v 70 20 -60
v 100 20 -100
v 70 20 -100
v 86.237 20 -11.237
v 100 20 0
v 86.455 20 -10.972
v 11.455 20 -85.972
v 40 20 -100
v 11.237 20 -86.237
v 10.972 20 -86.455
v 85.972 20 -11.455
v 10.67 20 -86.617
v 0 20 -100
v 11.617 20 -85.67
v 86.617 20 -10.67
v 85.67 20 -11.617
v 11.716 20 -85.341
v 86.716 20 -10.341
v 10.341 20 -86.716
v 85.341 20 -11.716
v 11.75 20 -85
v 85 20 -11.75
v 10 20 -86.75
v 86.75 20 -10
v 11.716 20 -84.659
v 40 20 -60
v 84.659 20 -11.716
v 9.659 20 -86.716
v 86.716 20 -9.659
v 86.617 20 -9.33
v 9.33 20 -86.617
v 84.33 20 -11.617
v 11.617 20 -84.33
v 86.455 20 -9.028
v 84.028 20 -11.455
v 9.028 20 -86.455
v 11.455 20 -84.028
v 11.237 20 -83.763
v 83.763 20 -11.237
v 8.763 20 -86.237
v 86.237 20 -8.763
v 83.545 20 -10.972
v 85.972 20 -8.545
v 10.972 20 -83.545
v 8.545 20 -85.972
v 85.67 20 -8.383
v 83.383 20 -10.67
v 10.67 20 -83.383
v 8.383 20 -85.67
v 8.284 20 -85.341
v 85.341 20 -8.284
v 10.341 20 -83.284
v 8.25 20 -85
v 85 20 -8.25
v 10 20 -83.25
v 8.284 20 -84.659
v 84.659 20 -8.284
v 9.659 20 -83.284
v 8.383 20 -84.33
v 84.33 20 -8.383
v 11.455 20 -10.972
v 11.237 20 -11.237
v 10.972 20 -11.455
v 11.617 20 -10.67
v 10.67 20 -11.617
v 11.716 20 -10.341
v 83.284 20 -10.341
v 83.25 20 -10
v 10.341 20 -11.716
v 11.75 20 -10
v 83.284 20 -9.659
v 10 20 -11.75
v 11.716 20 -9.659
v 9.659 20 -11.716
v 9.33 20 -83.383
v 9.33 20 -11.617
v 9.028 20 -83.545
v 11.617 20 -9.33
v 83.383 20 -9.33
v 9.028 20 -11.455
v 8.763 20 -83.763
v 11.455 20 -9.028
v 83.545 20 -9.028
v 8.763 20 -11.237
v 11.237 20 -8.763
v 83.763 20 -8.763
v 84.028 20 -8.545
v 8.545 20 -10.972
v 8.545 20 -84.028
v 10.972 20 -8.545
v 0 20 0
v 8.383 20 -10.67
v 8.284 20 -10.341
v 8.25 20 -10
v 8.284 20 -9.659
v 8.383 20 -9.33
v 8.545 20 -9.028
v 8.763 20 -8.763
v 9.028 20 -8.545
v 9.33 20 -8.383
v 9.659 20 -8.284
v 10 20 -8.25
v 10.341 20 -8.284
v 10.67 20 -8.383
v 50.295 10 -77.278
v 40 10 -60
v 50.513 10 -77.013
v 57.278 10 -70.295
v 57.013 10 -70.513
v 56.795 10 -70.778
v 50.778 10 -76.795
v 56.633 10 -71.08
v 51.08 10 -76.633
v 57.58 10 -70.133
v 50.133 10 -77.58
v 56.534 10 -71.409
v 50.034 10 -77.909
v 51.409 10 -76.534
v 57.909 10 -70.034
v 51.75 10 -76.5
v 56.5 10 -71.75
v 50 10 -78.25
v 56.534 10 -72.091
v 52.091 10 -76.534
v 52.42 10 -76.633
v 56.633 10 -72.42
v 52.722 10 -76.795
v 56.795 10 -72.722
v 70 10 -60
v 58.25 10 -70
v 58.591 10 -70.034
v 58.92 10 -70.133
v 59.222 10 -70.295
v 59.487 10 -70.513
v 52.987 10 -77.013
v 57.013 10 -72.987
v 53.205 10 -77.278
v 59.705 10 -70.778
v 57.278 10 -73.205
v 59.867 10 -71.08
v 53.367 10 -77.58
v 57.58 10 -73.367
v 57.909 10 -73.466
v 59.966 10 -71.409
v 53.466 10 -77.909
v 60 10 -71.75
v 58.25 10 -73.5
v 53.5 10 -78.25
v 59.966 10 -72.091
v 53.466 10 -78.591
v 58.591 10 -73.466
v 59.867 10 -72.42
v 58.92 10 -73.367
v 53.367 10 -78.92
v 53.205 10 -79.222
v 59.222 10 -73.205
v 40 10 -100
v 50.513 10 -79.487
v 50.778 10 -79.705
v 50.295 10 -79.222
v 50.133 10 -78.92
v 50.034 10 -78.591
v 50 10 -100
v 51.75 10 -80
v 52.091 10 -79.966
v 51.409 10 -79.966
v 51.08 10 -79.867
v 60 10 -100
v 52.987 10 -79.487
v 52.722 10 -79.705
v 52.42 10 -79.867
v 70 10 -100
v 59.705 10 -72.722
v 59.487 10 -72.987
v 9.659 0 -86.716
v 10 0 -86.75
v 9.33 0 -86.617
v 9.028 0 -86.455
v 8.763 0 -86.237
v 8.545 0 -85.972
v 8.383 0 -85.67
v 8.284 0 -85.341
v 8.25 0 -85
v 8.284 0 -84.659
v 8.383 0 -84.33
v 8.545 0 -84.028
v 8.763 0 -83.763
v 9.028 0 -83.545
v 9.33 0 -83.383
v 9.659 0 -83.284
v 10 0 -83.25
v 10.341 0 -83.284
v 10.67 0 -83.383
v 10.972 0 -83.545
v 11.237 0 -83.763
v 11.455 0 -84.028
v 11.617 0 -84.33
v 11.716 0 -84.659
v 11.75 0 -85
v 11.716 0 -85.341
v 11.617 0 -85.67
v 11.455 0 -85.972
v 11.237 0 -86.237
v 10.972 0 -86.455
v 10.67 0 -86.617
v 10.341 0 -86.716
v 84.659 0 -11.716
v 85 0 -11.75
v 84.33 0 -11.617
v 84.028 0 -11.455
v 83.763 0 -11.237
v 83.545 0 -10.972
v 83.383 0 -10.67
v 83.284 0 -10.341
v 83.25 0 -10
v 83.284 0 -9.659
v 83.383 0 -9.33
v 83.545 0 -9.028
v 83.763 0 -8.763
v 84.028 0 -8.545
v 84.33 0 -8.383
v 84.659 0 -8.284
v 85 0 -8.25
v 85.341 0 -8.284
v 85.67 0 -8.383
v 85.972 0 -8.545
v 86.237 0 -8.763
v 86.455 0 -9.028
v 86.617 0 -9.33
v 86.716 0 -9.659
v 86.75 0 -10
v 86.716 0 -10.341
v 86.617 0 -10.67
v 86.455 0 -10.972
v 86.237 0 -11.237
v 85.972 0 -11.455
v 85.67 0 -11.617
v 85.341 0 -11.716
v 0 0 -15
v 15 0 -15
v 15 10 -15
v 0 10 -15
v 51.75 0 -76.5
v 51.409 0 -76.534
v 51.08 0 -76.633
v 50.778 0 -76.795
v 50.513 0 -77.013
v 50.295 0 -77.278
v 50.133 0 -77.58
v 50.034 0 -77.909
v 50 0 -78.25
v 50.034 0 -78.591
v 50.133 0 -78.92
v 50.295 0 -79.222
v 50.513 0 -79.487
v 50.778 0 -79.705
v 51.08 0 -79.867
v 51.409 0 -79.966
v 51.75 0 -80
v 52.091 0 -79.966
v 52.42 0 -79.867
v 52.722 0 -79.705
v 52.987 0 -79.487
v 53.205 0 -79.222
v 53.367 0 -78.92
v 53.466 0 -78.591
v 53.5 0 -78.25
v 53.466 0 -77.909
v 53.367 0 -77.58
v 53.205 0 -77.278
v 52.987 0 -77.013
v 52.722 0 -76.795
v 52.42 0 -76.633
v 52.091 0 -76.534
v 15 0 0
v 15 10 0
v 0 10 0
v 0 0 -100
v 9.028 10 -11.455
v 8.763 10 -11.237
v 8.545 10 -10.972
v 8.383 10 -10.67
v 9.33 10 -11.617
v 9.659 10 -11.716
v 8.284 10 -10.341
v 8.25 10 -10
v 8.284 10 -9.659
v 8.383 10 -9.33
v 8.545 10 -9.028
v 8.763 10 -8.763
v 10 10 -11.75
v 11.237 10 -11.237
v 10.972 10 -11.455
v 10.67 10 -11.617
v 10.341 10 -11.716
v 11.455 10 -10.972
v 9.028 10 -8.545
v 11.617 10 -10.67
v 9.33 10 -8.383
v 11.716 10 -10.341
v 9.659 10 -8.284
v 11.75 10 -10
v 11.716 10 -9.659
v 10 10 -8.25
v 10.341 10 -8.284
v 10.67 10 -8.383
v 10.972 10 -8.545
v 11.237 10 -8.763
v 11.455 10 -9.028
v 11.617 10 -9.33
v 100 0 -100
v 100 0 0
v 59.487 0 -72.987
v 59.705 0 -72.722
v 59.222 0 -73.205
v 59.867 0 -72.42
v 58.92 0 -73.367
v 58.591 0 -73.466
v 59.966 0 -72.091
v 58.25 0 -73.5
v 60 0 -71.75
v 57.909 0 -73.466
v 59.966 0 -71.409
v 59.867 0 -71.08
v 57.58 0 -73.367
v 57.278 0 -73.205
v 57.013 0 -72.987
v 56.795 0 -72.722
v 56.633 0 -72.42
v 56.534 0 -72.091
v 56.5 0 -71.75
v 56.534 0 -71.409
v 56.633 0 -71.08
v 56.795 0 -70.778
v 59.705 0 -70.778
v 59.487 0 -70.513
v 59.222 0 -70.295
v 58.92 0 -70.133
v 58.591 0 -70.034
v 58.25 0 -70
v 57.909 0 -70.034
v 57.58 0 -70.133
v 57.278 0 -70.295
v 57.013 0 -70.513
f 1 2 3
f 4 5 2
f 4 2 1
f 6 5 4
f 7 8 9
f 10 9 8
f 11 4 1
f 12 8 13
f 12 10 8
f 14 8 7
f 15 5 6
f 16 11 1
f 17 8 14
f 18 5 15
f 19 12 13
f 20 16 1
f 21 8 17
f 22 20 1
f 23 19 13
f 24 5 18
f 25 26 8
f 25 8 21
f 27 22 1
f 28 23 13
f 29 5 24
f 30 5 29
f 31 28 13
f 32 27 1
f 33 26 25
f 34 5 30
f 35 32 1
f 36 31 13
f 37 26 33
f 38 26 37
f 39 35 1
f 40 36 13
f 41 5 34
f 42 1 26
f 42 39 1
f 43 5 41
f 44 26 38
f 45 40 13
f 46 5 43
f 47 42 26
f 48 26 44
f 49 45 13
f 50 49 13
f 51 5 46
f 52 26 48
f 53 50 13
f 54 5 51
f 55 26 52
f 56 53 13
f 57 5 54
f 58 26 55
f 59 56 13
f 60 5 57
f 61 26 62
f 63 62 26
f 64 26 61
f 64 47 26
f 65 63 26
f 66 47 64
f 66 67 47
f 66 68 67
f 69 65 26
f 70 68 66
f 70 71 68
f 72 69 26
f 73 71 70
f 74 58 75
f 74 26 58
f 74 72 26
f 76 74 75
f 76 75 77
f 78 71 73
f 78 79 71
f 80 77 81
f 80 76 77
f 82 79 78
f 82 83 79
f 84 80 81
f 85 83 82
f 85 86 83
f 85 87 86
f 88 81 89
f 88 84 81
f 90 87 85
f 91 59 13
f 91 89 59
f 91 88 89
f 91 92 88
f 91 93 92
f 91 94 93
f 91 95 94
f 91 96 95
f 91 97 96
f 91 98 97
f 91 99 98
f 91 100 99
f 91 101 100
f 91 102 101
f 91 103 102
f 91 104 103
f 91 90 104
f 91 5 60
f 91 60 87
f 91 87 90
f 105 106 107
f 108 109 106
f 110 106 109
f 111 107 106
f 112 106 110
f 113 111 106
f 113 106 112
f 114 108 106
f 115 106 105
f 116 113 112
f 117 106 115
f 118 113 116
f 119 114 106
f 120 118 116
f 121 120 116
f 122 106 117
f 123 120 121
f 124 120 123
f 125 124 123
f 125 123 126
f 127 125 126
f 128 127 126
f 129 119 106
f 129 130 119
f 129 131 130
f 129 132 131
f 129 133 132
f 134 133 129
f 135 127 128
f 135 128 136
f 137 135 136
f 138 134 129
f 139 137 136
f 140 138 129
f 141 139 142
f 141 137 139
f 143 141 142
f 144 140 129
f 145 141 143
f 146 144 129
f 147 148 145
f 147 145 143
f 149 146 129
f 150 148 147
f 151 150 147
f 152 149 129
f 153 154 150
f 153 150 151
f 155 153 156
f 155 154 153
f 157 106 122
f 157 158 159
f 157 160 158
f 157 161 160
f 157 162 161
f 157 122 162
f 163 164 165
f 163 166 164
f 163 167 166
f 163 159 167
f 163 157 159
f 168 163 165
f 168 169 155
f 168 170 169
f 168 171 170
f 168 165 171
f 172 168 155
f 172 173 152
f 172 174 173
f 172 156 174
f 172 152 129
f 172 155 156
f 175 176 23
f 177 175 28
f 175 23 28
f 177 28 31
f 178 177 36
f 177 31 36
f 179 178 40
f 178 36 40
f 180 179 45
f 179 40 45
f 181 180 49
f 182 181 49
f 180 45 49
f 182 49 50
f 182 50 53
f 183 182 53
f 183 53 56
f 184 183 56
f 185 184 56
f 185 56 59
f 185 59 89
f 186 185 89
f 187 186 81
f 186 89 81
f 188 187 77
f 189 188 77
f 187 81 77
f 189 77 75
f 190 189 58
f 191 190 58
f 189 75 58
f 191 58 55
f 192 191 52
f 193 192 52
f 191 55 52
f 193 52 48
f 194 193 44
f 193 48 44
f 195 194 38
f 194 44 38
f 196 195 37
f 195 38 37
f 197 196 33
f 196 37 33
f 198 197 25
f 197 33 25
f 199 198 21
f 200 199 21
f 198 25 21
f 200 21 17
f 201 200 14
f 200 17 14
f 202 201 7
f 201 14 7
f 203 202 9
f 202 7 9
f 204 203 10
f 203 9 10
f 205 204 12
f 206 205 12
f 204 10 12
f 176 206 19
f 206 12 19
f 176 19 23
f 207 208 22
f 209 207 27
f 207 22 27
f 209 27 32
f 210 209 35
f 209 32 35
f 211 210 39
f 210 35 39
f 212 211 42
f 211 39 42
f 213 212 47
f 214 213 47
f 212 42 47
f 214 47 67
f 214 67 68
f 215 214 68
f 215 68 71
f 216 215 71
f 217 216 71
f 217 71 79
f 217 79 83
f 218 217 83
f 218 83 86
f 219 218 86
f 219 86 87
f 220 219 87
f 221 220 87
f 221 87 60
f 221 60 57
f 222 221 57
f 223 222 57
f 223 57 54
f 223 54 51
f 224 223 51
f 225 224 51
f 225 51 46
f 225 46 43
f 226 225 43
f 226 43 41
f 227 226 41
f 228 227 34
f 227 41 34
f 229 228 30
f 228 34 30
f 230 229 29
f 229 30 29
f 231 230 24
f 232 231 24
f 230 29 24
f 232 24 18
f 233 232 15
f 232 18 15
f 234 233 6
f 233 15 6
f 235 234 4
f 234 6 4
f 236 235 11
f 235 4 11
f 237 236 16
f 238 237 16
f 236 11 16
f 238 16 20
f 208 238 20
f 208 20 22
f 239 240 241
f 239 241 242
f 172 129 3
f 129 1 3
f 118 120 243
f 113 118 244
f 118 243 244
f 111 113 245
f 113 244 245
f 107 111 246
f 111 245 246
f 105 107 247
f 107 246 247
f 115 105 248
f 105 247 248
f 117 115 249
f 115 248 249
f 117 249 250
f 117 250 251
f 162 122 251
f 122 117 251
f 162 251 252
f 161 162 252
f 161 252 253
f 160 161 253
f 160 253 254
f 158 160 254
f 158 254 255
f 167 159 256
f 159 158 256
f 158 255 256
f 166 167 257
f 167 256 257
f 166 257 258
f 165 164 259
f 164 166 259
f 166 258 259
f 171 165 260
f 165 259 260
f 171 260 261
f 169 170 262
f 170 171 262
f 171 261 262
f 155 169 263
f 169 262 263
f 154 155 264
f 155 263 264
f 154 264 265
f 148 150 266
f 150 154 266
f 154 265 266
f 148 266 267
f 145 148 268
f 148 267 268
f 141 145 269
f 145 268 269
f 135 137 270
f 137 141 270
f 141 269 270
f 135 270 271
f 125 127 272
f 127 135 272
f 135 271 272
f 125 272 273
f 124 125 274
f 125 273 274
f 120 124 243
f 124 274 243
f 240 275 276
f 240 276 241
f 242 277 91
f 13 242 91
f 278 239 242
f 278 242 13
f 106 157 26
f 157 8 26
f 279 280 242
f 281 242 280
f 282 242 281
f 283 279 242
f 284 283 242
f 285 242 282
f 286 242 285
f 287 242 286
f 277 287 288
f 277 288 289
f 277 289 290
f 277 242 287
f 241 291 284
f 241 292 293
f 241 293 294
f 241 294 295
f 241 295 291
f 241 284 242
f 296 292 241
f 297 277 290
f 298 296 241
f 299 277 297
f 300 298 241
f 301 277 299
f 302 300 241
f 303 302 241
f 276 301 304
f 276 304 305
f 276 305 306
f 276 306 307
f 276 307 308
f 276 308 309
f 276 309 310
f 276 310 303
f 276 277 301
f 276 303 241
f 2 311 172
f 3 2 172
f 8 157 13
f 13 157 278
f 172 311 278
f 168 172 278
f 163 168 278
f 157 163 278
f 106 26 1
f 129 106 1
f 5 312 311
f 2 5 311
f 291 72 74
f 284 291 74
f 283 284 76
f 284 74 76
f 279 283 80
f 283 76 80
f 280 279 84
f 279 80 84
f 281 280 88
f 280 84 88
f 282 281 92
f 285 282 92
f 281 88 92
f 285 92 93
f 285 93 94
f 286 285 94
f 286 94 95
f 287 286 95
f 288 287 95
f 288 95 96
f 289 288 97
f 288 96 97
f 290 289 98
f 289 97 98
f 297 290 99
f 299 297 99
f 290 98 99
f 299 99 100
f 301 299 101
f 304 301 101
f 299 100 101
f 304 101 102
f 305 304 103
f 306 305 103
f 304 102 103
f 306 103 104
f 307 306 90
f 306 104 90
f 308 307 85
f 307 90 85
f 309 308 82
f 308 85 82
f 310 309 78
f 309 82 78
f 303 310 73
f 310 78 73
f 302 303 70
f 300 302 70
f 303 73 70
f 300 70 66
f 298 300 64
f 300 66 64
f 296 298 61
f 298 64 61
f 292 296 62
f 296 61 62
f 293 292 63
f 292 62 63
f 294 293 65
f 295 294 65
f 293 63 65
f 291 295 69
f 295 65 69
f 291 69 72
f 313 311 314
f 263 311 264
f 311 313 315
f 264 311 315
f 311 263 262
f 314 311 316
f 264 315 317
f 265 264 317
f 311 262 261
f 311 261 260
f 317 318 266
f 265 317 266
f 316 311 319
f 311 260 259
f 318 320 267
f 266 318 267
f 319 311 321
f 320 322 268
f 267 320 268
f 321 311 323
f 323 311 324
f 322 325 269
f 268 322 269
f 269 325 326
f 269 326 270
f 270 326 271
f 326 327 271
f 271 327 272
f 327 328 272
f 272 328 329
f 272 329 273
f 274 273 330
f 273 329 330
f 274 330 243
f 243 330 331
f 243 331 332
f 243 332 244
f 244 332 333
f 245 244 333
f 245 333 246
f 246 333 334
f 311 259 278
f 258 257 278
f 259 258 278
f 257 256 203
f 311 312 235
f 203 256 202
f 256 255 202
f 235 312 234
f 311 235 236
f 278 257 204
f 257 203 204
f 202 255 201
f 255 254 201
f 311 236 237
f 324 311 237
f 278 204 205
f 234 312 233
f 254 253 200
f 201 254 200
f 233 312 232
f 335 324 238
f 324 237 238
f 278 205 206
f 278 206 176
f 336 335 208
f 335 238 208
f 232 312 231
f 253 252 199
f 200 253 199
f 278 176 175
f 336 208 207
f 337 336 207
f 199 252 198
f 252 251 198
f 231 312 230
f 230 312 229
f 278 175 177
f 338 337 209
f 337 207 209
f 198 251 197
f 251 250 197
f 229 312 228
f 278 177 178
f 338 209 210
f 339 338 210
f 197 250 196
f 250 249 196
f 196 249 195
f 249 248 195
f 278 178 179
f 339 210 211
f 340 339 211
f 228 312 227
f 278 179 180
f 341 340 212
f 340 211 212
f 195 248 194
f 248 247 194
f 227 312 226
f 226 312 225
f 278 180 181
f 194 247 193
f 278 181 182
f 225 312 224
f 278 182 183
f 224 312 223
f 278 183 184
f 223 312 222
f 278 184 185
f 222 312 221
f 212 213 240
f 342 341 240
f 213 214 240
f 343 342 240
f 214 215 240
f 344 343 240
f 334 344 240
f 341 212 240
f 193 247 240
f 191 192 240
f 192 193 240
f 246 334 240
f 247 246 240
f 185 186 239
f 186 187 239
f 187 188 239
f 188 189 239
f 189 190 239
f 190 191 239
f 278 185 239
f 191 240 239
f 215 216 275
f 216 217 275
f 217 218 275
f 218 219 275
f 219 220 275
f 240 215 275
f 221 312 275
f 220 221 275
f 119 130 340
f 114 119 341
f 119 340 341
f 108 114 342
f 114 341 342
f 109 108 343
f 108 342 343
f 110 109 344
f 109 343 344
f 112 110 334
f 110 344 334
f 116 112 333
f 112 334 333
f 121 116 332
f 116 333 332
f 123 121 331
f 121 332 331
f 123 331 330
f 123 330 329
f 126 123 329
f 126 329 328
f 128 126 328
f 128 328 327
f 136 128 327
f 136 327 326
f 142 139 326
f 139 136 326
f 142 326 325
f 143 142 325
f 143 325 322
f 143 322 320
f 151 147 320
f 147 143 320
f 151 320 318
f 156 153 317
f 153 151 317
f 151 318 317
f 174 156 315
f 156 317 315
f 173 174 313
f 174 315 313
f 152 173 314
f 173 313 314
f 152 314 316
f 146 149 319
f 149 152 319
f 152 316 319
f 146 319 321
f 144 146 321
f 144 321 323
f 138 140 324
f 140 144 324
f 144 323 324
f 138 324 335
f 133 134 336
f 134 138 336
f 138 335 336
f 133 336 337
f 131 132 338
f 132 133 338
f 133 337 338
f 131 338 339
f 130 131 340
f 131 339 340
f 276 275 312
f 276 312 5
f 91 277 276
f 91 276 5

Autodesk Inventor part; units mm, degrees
ref_plane "YZ Plane" through (0, 0, 0) normal (1, 0, 0) x (0, 1, 0)
ref_plane "XZ Plane" through (0, 0, 0) normal (0, 1, 0) x (-1, 0, 0)
ref_plane "XY Plane" through (0, 0, 0) normal (0, 0, 1) x (1, 0, 0)
sketch "Boceto1" plane through (0, 0, 0) normal (0, 1, 0) x (-1, 0, 0)
  line L0 (100, 100) -> (-100, 100)
  line L1 (-100, 100) -> (-100, -100)
  line L2 (-100, -100) -> (100, -100)
  line L3 (100, -100) -> (100, 100)
  line L4 (100, 100) -> (-100, -100) construction
  line L5 (-100, 100) -> (100, -100) construction
  point P0 (0, 0)
  dimension "d0" = 200
  dimension "d1" = 200
extrude "Extrusión1" add sketch "Boceto1" along normal blind 20
sketch "Boceto2" plane through (0, 20, 0) normal (0, 1, 0) x (1, 0, 0)
  circle A0 centre (-11.5239, -30.0616) radius 3
  circle A1 centre (11.4761, -30.0616) radius 3
  circle A2 centre (-11.5239, -60.0616) radius 3
  circle A3 centre (11.4761, -60.0616) radius 3
  line L0 (-0.0239, -45.0616) -> (-35.0239, -45.0616)
  line L1 (-35.0239, -45.0616) -> (-35.0239, -80.0616)
  line L2 (-0.0239, -45.0616) -> (34.9761, -45.0616)
  line L3 (-11.5239, -30.0616) -> (11.4761, -60.0616)
  line L4 (-11.5239, -60.0616) -> (11.4761, -30.0616)
  line L5 (34.9761, -20.0616) -> (-35.0239, -20.0616)
  line L6 (-35.0239, -20.0616) -> (-35.0239, -80.0616)
  line L7 (34.9761, -80.0616) -> (34.9761, -20.0616)
  line L8 (-105, -100.0616) -> (105, -100.0616)
  line L9 (-105.0239, -80.0616) -> (104.9761, -80.0616)
  line L10 (-35.0239, -80.0616) -> (34.9761, -80.0616)
  line L11 (105, -100.0616) -> (95.8154, -100.0616)
  line L12 (-105.0239, -80.0616) -> (104.9761, -80.0616)
  line L13 (105, -80.0616) -> (-105, -80.0616)
  line L14 (-105, -100.0616) -> (105, -100.0616)
  line L15 (105, -90.0616) -> (94.0798, -90.0616)
  line L16 (-105, -100.0616) -> (105, -100.0616)
  line L17 (-105, -80.0616) -> (105, -80.0616)
  line L18 (105, -80.0616) -> (105, -100.0616)
  line L19 (105, -100.0616) -> (-105, -100.0616)
  line L20 (-105, -100.0616) -> (-105, -80.0616)
  line L21 (-100, 100) -> (-100, -100) projected
  line L22 (-100, -100) -> (100.4077, -100)
  point P0 (0, 0)
  point P1 (0, -10.0616)
  point P2 (0, -90.0616)
  point P3 (-0.0478, -80.0616)
  dimension "d4" = 20
  dimension "d5" = 20
  dimension "d6" = 30
  dimension "d7" = 30
  dimension "d8" = 20
  dimension "d9" = 35
  dimension "d10" = 35
  dimension "d11" = 60
extrude "Extrusión2" cut sketch "Boceto2" against normal blind 10
sketch "Boceto3" plane through (0, 20, 0) normal (0, 1, 0) x (1, 0, 0)
  circle A0 centre (-11.5239, -30.0616) radius 3 projected
  circle A1 centre (-11.5239, -30.0616) radius 3
  circle A2 centre (11.4761, -30.0616) radius 3 projected
  circle A3 centre (11.4761, -30.0616) radius 3
  circle A4 centre (11.4761, -60.0616) radius 3 projected
  circle A5 centre (11.4761, -60.0616) radius 3
  circle A6 centre (-11.5239, -60.0616) radius 3
  point P0 (0, 0)
extrude "Extrusión3" cut sketch "Boceto3" against normal blind 20
sketch "Boceto4" plane through (0, 20, 0) normal (0, 1, 0) x (1, 0, 0)
  circle A0 centre (-51.75, 78.25) radius 1.75
  line L0 (-50, 70) -> (-60, 70)
  line L1 (-60, 70) -> (-60, 80)
  line L2 (-60, 80) -> (-50, 80)
  line L3 (-50, 80) -> (-50, 70)
  line L4 (-50, 70) -> (-60, 80) construction
  line L5 (-60, 70) -> (-50, 80) construction
  line L6 (-105, 90) -> (-105, -90)
  circle A1 centre (-58.25, 71.75) radius 1.75
  line L7 (0, 90) -> (0, 77.3124)
  circle A2 centre (51.75, 78.25) radius 1.75
  line L8 (50, 70) -> (60, 70)
  line L9 (60, 70) -> (60, 80)
  line L10 (60, 80) -> (50, 80)
  line L11 (50, 80) -> (50, 70)
  line L12 (50, 70) -> (60, 80) construction
  line L13 (60, 70) -> (50, 80) construction
  circle A3 centre (58.25, 71.75) radius 1.75
  line L14 (100, 100) -> (-100, 100) projected
  line L15 (-100, 100) -> (-100, -80.0616) projected
  line L16 (100, -80.0616) -> (100, 100) projected
  point P0 (0, 0)
  point P1 (0, 0)
  point P2 (-60, 75)
  point P3 (60, 75)
  dimension "d16" = 3.5
  dimension "d18" = 1.75
  dimension "d19" = 1.75
  dimension "d20" = 1.75
  dimension "d21" = 1.75
  dimension "d22" = 10
  dimension "d23" = 10
  dimension "d25" = 20
  dimension "d26" = 40
  dimension "d27" = 40
hole "Agujero1" at (-58.25, 20, -71.75) at (-51.75, 20, -78.25) at (58.25, 20, -71.75) at (51.75, 20, -78.25) direction (0, -1, 0) diameter 3.5 end through all
sketch "Boceto5" plane through (0, 20, 0) normal (0, 1, 0) x (1, 0, 0)
  line L0 (0, 90) -> (0, 68.25)
  circle A0 centre (-51.75, 78.25) radius 1.75 projected
  line L1 (-50, 78.25) -> (-50, 100)
  circle A1 centre (-58.25, 71.75) radius 1.75 projected
  line L2 (-60, 71.75) -> (-60, 100)
  line L3 (-60, 100) -> (-70, 100)
  line L4 (-50, 100) -> (-40, 100)
  line L5 (-40, 100) -> (-40, 60)
  line L6 (-40, 60) -> (-70, 60)
  line L7 (-70, 60) -> (-70, 100)
  line L8 (-70, 100) -> (-40, 100)
  circle A2 centre (51.75, 78.25) radius 1.75
  line L9 (50, 78.25) -> (50, 100)
  circle A3 centre (58.25, 71.75) radius 1.75
  line L10 (60, 71.75) -> (60, 100)
  line L11 (60, 100) -> (70, 100)
  line L12 (50, 100) -> (40, 100)
  line L13 (40, 100) -> (40, 60)
  line L14 (40, 60) -> (70, 60)
  line L15 (70, 60) -> (70, 100)
  line L16 (70, 100) -> (40, 100)
  point P0 (0, 0)
  dimension "d38" = 10
  dimension "d39" = 10
  dimension "d40" = 40
extrude "Extrusión4" cut sketch "Boceto5" against normal blind 10
ref_plane "Plano de trabajo1" through (0, 0, -100) normal (-1, 0, 0) x (0, 0, 1)
ref_plane "Plano de trabajo2" through (100, 0, 0) normal (0, 0, -1) x (-1, 0, 0)
sketch "Boceto7" plane through (0, 0, 0) normal (0, -1, 0) x (1, 0, 0)
  circle A0 centre (10, -10) radius 1.75
  line L0 (6.803, 0) -> (14.6069, 0)
  line L1 (0, 0) -> (0, -4.8284)
  line L2 (0, 0) -> (20.0354, 0)
  circle A1 centre (10, 10) radius 1.75
  line L3 (0, 0) -> (0, 4.8284)
  circle A2 centre (-10, -10) radius 1.75
  circle A3 centre (-10, 10) radius 1.75
  dimension "d52" = 3.5
  dimension "d54" = 10
  dimension "d55" = 10
hole "Agujero2" at (10, 0, -10) at (10, 0, 10) at (-10, 0, 10) at (-10, 0, -10) direction (0, 1, 0) diameter 3.5 end through all
sketch "Boceto8" plane through (0, 0, 0) normal (0, -1, 0) x (1, 0, 0)
  line L0 (-15, 15) -> (15, 15)
  line L1 (15, 15) -> (15, -15)
  line L2 (15, -15) -> (-15, -15)
  line L3 (-15, -15) -> (-15, 15)
  line L4 (-15, 15) -> (15, -15) construction
  line L5 (15, 15) -> (-15, -15) construction
  point P0 (0, 0)
  dimension "d63" = 30
  dimension "d64" = 30
extrude "Extrusión5" cut sketch "Boceto8" against normal blind 10
sketch "Boceto9" plane through (0, 0, 0) normal (0, -1, 0) x (1, 0, 0)
  circle A0 centre (85, -10) radius 1.75
  line L0 (100, 100) -> (100, -100) projected
  line L1 (140, 0) -> (-140, 0) projected
  circle A1 centre (85, 10) radius 1.75
  line L2 (0, 0) -> (0, 9.4908)
  circle A2 centre (-85, -10) radius 1.75
  circle A3 centre (-85, 10) radius 1.75
  line L3 (0, 0) -> (6.3157, 6.3157)
  line L4 (0, 0) -> (8.9318, 0) construction
  circle A4 centre (10, 85) radius 1.75
  circle A5 centre (-10, -85) radius 1.75
  line L5 (0, 0) -> (5.9531, -5.9531)
  line L6 (0, 0) -> (8.419, 0) construction
  circle A6 centre (10, -85) radius 1.75
  circle A7 centre (-10, 85) radius 1.75
  dimension "d67" = 3.5
  dimension "d68" = 15
  dimension "d69" = 10
  dimension "d70" = 45
  dimension "d71" = 45
hole "Agujero3" at (-10, 0, 85) at (10, 0, 85) at (85, 0, 10) at (85, 0, -10) at (-85, 0, 10) at (-85, 0, -10) at (-10, 0, -85) at (10, 0, -85) direction (0, 1, 0) diameter 3.5 end through all
split "Dividir3" plane through (100, 0, 0) removes the side toward (0, 0, 1)
split "Dividir4" plane through (0, 0, -100) removes the side toward (-1, 0, 0)
properties part number "base_front_2"
